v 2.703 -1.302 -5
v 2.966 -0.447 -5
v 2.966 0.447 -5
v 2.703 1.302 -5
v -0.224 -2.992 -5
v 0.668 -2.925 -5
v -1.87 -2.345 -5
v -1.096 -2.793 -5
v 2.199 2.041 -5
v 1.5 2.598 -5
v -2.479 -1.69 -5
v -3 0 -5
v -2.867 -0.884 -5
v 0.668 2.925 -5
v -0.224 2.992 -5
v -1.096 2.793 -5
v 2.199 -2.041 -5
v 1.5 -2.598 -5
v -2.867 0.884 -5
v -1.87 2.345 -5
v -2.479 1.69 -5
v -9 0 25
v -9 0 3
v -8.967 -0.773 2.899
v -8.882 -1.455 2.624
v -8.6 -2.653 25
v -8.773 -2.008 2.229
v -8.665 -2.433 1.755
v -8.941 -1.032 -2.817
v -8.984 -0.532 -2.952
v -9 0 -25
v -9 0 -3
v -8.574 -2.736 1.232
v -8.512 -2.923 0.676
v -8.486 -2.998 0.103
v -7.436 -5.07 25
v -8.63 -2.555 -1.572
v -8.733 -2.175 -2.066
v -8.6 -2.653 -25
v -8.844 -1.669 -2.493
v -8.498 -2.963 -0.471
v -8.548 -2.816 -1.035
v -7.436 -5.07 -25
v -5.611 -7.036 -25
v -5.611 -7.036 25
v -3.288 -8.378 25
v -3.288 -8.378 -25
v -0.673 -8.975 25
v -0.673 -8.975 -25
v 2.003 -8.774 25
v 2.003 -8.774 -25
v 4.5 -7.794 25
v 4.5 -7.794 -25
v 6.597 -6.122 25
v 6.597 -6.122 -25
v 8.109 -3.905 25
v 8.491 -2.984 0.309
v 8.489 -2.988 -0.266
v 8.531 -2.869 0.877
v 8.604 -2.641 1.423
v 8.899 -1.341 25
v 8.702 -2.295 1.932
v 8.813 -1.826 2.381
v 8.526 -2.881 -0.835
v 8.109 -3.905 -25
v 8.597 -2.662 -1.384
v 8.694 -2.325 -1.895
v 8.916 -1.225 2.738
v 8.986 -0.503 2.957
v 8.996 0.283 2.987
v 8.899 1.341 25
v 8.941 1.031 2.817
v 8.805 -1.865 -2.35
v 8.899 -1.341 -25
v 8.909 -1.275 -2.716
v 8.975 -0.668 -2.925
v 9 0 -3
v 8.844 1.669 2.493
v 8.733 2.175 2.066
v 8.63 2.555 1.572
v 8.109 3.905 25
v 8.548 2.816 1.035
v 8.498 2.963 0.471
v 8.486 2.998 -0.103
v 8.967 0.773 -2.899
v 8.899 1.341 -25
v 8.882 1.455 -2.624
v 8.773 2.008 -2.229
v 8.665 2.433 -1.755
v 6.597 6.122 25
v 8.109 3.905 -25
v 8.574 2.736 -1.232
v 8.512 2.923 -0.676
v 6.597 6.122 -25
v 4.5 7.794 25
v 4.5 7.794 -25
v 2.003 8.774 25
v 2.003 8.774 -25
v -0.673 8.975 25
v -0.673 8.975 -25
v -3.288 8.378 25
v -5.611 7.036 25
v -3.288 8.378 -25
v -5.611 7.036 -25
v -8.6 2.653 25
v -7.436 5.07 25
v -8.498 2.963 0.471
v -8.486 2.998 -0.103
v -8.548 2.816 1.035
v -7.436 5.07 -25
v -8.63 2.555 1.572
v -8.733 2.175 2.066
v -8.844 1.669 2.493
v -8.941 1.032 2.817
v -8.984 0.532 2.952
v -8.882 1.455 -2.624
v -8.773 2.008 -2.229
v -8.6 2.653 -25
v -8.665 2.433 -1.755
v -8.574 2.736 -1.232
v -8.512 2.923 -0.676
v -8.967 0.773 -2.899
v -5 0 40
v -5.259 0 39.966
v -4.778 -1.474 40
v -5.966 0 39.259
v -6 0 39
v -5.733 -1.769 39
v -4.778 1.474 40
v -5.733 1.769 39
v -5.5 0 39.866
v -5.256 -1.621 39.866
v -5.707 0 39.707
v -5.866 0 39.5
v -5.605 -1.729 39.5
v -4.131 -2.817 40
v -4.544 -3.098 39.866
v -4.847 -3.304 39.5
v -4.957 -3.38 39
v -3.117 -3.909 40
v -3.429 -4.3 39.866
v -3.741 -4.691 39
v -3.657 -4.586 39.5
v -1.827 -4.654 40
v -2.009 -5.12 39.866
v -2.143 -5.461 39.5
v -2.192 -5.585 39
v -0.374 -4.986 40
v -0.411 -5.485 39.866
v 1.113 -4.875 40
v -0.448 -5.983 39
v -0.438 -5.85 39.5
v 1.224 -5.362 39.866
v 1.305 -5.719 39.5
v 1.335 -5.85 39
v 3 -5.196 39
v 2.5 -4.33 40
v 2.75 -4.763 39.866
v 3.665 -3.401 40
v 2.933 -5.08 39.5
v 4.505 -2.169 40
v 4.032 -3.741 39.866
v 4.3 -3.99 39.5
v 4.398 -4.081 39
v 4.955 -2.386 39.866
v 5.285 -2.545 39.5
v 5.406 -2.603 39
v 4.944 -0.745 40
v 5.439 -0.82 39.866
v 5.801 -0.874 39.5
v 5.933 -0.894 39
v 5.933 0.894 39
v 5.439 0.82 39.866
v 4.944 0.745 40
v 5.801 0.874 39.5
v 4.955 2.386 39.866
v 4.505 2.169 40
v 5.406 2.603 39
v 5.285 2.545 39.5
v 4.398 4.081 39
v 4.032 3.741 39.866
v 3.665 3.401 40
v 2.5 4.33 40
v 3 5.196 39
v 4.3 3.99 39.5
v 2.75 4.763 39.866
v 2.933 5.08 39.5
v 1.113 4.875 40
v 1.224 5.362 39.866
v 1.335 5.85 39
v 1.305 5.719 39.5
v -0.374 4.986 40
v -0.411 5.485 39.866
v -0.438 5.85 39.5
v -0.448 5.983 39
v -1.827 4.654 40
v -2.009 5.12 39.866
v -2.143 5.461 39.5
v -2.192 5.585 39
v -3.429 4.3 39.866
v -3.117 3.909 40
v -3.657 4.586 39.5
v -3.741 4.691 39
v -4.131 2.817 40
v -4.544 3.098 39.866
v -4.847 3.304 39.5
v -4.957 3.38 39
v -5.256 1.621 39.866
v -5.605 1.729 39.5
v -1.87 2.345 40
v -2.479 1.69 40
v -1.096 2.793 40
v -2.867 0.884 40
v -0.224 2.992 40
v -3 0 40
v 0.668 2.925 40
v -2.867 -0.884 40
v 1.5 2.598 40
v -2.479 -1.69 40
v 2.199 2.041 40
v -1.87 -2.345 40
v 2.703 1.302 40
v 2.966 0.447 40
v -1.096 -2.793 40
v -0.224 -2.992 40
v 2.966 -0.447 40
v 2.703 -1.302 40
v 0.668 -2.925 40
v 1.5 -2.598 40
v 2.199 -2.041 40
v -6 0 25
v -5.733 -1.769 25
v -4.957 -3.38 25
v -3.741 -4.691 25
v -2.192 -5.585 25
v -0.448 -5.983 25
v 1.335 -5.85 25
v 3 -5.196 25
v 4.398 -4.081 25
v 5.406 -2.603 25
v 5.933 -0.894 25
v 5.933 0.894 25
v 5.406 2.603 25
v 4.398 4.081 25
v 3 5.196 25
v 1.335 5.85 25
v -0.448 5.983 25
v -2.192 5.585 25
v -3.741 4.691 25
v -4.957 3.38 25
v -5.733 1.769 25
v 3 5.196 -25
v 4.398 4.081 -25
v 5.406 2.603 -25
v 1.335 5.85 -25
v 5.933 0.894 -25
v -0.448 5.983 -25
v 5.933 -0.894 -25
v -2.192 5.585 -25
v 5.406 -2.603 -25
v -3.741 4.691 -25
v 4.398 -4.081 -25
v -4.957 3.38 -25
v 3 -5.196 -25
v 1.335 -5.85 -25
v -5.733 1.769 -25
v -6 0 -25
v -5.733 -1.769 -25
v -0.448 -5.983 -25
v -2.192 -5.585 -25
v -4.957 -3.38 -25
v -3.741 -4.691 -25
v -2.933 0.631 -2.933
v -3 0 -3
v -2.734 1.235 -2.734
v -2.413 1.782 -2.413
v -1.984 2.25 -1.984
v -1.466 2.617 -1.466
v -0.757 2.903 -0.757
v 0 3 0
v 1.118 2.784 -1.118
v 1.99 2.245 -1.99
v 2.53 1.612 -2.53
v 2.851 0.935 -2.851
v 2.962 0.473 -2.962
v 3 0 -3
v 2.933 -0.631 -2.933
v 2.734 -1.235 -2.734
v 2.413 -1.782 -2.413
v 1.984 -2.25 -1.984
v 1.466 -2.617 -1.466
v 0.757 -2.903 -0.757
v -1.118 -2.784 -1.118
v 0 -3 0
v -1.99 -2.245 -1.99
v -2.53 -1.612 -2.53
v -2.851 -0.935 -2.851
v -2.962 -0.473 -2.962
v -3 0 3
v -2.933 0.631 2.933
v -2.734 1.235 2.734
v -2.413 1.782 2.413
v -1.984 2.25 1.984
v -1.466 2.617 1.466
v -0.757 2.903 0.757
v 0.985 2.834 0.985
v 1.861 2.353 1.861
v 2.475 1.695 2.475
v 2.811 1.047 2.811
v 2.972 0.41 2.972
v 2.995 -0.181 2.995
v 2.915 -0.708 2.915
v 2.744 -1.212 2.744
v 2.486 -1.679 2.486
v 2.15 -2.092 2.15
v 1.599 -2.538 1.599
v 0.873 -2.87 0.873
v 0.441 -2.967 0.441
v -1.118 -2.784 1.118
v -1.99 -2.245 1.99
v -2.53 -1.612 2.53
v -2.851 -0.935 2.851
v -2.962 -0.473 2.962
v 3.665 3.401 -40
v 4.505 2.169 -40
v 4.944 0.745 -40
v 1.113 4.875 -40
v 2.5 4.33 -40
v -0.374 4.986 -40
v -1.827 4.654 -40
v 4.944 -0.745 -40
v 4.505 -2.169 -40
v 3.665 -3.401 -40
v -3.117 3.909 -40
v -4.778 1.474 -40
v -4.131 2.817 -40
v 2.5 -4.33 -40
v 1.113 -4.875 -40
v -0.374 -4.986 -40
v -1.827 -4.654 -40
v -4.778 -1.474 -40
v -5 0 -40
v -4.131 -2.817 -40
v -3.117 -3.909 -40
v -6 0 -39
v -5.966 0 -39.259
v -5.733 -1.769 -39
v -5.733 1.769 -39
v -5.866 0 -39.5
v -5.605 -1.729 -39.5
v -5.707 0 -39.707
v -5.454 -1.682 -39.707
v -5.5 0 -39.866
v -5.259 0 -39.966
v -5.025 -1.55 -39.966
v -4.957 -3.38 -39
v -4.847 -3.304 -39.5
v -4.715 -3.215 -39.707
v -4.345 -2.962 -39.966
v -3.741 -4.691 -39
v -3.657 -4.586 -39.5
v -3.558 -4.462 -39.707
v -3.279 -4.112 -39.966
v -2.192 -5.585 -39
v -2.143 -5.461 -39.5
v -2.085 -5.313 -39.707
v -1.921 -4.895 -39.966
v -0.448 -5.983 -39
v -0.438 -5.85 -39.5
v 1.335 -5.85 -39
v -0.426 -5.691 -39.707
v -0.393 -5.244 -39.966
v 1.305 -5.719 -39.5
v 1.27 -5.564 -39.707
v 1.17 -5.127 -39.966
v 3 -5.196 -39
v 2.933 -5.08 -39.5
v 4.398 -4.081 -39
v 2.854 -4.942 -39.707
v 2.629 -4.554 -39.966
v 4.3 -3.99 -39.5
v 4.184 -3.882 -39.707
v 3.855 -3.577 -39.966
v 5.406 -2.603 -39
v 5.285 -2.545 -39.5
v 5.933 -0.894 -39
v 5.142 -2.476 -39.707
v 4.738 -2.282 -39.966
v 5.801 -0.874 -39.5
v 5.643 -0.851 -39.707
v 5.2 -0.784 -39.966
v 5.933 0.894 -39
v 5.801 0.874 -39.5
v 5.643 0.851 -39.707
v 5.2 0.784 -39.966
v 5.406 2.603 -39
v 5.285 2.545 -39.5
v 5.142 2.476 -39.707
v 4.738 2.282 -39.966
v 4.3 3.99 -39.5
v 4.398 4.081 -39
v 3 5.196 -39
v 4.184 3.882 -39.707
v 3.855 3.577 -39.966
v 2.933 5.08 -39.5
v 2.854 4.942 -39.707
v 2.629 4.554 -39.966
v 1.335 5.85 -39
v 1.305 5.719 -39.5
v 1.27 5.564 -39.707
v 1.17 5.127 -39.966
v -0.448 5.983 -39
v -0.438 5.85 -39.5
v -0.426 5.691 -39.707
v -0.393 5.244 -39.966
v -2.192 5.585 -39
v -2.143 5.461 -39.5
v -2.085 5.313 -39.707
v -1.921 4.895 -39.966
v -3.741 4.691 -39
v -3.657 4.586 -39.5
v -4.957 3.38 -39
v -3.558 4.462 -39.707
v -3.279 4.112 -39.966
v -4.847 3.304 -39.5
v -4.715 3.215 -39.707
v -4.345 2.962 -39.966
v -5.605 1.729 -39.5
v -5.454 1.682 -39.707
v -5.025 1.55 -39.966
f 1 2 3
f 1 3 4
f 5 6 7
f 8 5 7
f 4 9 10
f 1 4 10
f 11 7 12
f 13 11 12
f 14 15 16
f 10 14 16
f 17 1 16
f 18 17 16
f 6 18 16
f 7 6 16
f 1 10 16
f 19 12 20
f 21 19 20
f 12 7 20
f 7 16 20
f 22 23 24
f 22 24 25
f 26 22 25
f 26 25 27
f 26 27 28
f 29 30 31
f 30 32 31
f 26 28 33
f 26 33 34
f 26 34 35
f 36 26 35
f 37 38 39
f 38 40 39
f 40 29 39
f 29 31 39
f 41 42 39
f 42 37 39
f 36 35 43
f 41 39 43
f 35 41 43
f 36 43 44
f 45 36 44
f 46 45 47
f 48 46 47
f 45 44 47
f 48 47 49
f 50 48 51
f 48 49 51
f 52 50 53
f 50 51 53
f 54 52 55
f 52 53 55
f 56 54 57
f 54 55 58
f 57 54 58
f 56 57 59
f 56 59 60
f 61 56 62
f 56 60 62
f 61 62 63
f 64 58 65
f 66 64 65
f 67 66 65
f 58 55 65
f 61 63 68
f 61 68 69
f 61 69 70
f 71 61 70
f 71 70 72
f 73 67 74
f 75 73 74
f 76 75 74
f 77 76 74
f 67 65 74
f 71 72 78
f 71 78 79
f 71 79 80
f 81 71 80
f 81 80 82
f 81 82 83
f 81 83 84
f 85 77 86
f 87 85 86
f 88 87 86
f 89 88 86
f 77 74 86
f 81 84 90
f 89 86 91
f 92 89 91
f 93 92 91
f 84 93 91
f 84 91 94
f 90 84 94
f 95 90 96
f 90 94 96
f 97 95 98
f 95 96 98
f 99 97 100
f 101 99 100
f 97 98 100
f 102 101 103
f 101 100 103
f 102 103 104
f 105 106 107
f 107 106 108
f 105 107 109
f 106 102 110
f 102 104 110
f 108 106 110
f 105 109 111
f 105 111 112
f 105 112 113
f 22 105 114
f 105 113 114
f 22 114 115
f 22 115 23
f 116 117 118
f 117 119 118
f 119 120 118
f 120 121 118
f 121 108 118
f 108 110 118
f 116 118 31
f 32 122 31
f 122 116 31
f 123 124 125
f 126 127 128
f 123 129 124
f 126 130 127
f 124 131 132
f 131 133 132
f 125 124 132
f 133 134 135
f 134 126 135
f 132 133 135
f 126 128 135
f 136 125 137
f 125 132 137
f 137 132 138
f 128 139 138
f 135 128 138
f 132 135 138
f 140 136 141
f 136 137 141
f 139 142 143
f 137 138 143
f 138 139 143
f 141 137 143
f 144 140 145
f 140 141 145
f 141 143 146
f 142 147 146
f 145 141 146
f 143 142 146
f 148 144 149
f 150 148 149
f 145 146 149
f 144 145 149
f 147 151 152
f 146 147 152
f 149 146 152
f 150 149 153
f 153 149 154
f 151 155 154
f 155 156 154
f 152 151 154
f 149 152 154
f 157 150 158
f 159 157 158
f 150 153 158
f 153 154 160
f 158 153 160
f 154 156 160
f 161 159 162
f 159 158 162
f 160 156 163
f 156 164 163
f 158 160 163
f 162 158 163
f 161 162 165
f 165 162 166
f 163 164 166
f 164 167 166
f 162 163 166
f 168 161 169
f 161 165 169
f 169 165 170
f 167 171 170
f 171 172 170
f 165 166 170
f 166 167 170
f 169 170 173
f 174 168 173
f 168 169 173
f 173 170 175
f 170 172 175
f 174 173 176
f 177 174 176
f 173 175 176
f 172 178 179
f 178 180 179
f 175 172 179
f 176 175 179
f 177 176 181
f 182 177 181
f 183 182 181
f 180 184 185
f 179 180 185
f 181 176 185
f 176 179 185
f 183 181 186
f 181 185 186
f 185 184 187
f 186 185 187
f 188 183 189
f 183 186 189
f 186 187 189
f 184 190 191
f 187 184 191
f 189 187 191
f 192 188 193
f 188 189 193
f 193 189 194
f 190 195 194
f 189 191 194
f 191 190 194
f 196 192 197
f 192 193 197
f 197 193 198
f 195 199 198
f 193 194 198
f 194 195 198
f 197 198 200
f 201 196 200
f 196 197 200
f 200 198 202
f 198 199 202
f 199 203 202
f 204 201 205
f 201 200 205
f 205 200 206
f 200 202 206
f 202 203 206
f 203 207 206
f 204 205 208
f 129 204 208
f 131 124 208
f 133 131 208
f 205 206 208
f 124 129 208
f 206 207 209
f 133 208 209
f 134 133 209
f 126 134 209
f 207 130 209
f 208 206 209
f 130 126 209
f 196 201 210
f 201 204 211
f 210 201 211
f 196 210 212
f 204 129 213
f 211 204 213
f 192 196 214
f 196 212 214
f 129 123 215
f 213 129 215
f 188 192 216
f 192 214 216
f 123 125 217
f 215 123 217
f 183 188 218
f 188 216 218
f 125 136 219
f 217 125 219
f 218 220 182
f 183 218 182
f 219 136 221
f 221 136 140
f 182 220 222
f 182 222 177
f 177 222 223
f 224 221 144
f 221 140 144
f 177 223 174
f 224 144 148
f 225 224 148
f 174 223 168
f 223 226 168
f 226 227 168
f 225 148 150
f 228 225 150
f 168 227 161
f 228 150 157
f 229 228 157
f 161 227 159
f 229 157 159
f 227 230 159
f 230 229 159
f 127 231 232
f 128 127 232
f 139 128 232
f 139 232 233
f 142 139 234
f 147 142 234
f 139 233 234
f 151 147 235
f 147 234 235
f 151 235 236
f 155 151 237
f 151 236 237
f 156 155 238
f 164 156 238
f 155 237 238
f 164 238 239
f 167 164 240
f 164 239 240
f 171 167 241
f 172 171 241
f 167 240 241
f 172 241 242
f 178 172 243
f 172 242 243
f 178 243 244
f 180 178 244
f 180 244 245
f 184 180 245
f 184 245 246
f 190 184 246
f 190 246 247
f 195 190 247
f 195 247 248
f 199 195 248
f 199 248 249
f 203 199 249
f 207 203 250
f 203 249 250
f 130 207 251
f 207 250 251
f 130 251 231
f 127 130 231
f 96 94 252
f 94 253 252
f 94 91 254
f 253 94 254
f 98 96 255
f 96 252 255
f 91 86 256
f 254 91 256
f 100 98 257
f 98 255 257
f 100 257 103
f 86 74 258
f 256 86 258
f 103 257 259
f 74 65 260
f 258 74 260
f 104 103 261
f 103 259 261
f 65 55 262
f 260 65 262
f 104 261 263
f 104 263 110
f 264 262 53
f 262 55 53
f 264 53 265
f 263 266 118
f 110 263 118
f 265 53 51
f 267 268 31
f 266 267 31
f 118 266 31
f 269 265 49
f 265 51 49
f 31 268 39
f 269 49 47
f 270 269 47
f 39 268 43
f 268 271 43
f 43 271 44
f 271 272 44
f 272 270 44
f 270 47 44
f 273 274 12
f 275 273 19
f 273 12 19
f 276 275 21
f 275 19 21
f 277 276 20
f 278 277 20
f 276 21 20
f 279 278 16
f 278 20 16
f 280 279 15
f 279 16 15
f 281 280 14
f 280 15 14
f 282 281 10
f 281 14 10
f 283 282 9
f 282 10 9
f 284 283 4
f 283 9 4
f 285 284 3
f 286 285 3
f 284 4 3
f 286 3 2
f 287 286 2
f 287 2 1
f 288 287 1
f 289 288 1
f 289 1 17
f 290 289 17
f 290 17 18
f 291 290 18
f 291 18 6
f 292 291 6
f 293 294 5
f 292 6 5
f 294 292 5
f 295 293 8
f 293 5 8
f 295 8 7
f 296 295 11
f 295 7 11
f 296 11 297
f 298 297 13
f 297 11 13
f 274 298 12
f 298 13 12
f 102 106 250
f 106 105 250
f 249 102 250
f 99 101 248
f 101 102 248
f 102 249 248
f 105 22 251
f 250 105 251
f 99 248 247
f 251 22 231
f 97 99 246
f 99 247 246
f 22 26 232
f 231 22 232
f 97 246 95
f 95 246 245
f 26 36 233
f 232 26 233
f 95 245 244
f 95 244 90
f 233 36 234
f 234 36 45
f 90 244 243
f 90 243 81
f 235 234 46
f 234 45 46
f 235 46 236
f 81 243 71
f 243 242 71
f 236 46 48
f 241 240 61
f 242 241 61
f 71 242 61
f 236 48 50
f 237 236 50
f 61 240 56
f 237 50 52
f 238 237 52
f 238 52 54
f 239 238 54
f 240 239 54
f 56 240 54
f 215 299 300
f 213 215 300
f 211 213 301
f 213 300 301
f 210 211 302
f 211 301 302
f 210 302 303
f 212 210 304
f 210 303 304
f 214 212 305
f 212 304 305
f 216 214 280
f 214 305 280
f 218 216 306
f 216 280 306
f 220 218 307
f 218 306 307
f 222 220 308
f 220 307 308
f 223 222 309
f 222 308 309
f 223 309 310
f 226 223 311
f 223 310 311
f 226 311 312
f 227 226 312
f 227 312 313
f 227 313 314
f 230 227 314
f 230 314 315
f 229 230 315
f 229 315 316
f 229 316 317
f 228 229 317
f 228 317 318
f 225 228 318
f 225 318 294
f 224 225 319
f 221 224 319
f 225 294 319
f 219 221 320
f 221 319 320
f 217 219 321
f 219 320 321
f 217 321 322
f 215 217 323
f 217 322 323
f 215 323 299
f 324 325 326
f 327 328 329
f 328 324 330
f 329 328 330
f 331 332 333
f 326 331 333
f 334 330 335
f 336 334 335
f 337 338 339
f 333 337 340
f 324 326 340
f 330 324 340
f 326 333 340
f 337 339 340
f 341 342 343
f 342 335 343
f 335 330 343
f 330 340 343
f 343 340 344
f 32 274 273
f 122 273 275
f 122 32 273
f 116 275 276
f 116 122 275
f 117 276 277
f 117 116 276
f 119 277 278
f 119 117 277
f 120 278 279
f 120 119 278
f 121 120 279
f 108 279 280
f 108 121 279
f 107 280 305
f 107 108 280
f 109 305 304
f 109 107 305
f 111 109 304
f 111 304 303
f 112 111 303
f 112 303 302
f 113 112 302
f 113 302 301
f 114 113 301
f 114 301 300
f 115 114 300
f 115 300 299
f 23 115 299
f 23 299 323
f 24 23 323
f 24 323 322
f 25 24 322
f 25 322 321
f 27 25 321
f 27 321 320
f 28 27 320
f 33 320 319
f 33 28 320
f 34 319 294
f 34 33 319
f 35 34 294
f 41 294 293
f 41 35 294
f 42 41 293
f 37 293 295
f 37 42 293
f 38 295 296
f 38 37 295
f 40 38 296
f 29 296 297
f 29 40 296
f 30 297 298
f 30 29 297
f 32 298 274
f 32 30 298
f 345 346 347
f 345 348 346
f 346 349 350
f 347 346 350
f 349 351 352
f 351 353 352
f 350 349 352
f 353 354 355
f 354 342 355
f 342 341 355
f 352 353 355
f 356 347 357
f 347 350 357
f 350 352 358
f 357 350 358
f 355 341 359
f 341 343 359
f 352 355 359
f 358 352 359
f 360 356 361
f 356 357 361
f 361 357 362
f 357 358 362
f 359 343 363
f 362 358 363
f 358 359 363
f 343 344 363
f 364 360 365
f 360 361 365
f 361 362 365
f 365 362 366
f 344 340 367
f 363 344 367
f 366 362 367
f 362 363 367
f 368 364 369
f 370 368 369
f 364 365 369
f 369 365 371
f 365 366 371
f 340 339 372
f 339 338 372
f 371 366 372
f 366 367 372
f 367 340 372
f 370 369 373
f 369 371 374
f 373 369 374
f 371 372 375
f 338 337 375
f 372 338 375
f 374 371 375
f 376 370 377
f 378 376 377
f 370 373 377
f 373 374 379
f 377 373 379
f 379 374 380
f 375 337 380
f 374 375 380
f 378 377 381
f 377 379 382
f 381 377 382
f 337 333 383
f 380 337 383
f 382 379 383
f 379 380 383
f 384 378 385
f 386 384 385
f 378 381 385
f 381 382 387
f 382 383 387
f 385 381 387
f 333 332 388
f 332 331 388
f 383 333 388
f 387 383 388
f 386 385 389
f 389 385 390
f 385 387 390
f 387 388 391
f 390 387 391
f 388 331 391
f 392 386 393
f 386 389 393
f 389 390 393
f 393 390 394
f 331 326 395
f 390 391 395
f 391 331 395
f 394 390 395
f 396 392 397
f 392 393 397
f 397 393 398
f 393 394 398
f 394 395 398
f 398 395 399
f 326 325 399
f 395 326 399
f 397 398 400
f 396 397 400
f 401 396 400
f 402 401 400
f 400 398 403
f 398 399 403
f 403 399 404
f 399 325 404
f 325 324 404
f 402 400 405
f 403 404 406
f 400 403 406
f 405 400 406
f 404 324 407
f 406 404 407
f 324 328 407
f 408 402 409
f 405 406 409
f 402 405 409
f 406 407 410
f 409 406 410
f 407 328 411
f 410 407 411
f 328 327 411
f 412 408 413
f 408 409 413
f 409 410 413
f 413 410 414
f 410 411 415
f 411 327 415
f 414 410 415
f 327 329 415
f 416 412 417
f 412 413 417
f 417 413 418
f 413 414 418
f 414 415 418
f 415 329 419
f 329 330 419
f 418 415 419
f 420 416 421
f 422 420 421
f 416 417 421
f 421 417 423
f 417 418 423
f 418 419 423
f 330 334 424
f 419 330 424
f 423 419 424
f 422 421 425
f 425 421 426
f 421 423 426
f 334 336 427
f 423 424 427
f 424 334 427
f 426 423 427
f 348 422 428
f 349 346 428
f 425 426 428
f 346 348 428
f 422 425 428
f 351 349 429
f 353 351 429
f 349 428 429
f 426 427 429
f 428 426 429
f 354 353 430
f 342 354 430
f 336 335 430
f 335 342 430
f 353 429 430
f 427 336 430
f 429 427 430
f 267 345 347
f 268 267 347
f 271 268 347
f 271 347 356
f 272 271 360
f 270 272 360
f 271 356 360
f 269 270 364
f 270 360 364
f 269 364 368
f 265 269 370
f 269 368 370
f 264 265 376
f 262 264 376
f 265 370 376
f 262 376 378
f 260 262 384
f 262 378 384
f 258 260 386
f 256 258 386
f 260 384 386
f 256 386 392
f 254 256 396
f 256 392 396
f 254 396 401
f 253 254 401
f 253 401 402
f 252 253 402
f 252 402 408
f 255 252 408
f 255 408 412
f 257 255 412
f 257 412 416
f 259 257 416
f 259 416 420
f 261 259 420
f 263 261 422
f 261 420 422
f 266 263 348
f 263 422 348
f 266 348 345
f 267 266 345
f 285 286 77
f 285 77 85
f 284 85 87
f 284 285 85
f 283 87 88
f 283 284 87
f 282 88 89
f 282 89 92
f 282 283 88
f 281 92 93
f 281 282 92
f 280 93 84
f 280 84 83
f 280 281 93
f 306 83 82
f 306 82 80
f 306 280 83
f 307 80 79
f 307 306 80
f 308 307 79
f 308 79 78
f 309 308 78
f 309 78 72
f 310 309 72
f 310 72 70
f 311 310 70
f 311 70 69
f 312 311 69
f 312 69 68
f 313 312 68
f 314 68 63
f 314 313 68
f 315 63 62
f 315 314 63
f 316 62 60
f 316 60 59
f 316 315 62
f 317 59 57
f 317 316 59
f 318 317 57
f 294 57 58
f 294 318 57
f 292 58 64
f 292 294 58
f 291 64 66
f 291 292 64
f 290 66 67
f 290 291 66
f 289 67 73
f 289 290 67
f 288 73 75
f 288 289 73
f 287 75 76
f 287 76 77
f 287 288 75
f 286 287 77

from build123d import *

# Parameters (mm, degrees)
FILLET1_R               = 1
HOLE1_D                 = 6
HOLE1_DEPTH             = 45
CUT_EXTRUDE1_DEPTH      = 42.976183724
CUT_EXTRUDE1_DEPTH_BACK = 42.976183724
SKETCH9_R               = 3


with BuildPart() as part:
    # Sketch1 → Revolve1 (revolve)
    with BuildSketch(Plane(origin=(0, 0, 0), x_dir=(0, 0, -1), z_dir=(1, 0, 0)), mode=Mode.PRIVATE) as revolve1_sk:
        Polygon((-40, 0), (-40, 6), (-25, 6), (-25, 9), (25, 9), (25, 6), (40, 6), (40, 0), align=None)
    revolve(revolve1_sk.sketch.rotate(Axis((0, 0, -40), (0, 0, 1)), 90), axis=Axis((0, 0, -40), (0, 0, 1)))

    # Fillet1
    fillet1_edges = [part.edges().sort_by_distance(p)[0] for p in [
        (6, 0, -40),
        (6, 0, 40),
    ]]
    fillet(fillet1_edges, radius=FILLET1_R)

    # Hole1
    with Locations(Plane.XY.offset(40)):
        with Locations((0, 0)):
            Hole(HOLE1_D / 2, depth=HOLE1_DEPTH)

    # Sketch9 → Cut-Extrude1 (cut, two sides: drawn at the far end of the back side and taken through both)
    with BuildSketch(Plane(origin=(0, 0, 0), x_dir=(0, 0, -1), z_dir=(1, 0, 0)).offset(-CUT_EXTRUDE1_DEPTH_BACK)):
        Circle(SKETCH9_R)
    extrude(amount=CUT_EXTRUDE1_DEPTH + CUT_EXTRUDE1_DEPTH_BACK, mode=Mode.SUBTRACT)


solid = part.part
